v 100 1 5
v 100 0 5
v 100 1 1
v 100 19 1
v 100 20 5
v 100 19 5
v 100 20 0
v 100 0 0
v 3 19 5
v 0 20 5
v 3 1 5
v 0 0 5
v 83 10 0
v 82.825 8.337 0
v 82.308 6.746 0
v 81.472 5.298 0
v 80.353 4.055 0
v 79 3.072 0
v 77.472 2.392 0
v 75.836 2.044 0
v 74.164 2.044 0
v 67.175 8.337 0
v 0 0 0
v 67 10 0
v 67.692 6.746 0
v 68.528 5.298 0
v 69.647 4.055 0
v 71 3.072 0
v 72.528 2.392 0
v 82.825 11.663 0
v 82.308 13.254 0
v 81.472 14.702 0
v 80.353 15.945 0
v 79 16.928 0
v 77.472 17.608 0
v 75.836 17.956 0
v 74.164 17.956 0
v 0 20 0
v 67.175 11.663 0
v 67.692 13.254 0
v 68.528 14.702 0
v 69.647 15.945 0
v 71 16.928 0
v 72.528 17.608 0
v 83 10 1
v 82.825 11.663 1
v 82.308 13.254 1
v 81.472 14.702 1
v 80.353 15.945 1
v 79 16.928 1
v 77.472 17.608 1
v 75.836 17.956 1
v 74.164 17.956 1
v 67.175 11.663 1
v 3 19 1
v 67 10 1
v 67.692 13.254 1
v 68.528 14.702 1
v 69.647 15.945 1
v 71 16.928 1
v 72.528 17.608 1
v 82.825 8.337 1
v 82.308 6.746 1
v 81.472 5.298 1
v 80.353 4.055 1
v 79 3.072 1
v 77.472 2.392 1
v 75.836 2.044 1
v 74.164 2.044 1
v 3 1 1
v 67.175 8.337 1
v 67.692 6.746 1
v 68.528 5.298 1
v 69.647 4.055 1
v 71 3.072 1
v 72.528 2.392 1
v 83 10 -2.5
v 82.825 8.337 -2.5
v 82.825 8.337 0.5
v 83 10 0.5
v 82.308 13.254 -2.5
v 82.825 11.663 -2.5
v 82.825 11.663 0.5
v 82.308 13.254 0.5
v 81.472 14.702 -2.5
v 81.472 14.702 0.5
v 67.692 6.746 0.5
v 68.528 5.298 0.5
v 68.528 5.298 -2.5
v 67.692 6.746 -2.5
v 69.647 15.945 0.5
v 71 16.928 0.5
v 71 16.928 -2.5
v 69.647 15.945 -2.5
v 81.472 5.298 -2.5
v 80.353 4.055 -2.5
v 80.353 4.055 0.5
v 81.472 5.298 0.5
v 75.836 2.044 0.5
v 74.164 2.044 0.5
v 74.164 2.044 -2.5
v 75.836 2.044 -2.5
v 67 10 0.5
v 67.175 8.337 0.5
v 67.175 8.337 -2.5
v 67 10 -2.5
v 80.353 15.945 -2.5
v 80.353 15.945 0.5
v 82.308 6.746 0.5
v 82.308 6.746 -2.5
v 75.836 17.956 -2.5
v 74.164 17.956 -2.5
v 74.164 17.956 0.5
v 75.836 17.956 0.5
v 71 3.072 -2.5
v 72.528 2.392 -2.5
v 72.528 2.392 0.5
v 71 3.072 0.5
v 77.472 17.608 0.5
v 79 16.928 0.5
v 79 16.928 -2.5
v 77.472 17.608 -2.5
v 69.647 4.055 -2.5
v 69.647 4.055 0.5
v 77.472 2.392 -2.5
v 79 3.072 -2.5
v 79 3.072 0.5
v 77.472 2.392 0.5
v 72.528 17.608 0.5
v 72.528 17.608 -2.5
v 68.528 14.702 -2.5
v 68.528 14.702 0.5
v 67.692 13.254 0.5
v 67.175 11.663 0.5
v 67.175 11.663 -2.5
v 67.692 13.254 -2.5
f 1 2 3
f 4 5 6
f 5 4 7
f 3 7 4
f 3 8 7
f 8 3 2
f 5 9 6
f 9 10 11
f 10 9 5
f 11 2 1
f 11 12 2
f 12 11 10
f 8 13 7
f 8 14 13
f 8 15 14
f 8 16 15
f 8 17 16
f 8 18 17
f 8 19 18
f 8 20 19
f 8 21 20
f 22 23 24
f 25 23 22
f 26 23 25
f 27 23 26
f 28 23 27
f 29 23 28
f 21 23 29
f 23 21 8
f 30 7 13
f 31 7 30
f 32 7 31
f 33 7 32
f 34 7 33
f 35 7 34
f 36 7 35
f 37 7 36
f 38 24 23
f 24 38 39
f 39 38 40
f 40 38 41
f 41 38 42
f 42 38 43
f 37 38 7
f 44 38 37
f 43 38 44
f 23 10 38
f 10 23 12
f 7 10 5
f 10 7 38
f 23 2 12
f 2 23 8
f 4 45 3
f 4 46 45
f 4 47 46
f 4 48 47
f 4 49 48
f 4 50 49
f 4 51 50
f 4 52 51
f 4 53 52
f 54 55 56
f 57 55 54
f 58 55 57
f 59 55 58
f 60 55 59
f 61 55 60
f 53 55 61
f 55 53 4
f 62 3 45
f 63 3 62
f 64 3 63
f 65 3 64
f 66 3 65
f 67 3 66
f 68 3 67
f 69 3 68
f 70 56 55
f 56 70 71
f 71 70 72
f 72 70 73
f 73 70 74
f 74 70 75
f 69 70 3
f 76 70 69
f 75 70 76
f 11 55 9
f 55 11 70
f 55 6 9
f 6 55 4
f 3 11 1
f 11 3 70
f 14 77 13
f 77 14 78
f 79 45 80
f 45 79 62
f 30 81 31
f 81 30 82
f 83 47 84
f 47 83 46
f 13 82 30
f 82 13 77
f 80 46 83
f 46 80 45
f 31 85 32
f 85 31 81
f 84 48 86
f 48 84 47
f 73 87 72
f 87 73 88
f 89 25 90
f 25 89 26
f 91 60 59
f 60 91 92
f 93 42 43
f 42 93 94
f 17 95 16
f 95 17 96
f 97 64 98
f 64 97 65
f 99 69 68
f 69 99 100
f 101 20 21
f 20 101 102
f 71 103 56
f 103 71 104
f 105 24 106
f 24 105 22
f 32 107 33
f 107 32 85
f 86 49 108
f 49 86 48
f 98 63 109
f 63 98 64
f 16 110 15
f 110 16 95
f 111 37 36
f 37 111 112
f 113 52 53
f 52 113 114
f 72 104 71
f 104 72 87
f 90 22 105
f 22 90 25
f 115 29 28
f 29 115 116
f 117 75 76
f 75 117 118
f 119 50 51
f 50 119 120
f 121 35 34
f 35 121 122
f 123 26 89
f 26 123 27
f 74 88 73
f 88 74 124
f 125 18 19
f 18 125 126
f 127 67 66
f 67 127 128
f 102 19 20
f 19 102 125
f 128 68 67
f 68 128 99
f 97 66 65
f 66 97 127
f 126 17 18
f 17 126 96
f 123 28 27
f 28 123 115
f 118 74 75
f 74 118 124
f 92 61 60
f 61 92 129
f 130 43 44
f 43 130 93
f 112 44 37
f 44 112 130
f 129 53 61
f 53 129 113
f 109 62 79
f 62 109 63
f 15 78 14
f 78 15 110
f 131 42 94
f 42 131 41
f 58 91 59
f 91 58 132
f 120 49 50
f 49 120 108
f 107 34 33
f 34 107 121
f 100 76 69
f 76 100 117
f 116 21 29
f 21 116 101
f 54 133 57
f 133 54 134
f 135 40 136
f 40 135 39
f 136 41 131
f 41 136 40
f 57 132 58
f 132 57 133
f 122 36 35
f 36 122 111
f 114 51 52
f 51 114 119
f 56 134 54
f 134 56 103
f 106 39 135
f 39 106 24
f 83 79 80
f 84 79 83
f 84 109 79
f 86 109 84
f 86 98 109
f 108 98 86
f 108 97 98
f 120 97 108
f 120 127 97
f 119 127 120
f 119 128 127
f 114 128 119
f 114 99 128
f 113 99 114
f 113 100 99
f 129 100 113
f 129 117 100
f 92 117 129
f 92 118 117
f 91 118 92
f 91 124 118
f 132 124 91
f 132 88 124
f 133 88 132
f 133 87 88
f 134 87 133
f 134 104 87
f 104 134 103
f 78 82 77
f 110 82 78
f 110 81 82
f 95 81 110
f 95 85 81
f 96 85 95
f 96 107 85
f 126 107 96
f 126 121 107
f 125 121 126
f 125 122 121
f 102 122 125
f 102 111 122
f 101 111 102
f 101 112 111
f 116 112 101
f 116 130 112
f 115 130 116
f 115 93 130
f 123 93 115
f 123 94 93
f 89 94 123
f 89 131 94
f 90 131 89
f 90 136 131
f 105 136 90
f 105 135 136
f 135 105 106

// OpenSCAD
$fs=0.2;

WALL_THICK=1.;
RIFFLE_LENGTH=100.;
RIFFLE_WIDTH=20.;
RIFFLE_HEIGHT=5.;
CUBE_DIM=[RIFFLE_LENGTH,RIFFLE_WIDTH,RIFFLE_HEIGHT];
//SCALE=10.;
SPHERE_R=6.;
DRILL_R=.2;
BATTERY_R=5.;

difference() {
cube(CUBE_DIM);
translate([2.,0.,0.])
//5#cylinder(r=DRILL_R,h=RIFFLE_HEIGHT*2.1);
translate([WALL_THICK,WALL_THICK,WALL_THICK])
cube([RIFFLE_LENGTH*1.1,RIFFLE_WIDTH-WALL_THICK*2,RIFFLE_HEIGHT*2-WALL_THICK*2]);
translate([RIFFLE_LENGTH*3/4,RIFFLE_WIDTH/2,-RIFFLE_HEIGHT/2])
cylinder(r=8.,h=RIFFLE_HEIGHT*2);
}

translate([RIFFLE_LENGTH*3/4,RIFFLE_WIDTH/2,-RIFFLE_HEIGHT/2])
cylinder(r=8.,h=WALL_THICK*3);
